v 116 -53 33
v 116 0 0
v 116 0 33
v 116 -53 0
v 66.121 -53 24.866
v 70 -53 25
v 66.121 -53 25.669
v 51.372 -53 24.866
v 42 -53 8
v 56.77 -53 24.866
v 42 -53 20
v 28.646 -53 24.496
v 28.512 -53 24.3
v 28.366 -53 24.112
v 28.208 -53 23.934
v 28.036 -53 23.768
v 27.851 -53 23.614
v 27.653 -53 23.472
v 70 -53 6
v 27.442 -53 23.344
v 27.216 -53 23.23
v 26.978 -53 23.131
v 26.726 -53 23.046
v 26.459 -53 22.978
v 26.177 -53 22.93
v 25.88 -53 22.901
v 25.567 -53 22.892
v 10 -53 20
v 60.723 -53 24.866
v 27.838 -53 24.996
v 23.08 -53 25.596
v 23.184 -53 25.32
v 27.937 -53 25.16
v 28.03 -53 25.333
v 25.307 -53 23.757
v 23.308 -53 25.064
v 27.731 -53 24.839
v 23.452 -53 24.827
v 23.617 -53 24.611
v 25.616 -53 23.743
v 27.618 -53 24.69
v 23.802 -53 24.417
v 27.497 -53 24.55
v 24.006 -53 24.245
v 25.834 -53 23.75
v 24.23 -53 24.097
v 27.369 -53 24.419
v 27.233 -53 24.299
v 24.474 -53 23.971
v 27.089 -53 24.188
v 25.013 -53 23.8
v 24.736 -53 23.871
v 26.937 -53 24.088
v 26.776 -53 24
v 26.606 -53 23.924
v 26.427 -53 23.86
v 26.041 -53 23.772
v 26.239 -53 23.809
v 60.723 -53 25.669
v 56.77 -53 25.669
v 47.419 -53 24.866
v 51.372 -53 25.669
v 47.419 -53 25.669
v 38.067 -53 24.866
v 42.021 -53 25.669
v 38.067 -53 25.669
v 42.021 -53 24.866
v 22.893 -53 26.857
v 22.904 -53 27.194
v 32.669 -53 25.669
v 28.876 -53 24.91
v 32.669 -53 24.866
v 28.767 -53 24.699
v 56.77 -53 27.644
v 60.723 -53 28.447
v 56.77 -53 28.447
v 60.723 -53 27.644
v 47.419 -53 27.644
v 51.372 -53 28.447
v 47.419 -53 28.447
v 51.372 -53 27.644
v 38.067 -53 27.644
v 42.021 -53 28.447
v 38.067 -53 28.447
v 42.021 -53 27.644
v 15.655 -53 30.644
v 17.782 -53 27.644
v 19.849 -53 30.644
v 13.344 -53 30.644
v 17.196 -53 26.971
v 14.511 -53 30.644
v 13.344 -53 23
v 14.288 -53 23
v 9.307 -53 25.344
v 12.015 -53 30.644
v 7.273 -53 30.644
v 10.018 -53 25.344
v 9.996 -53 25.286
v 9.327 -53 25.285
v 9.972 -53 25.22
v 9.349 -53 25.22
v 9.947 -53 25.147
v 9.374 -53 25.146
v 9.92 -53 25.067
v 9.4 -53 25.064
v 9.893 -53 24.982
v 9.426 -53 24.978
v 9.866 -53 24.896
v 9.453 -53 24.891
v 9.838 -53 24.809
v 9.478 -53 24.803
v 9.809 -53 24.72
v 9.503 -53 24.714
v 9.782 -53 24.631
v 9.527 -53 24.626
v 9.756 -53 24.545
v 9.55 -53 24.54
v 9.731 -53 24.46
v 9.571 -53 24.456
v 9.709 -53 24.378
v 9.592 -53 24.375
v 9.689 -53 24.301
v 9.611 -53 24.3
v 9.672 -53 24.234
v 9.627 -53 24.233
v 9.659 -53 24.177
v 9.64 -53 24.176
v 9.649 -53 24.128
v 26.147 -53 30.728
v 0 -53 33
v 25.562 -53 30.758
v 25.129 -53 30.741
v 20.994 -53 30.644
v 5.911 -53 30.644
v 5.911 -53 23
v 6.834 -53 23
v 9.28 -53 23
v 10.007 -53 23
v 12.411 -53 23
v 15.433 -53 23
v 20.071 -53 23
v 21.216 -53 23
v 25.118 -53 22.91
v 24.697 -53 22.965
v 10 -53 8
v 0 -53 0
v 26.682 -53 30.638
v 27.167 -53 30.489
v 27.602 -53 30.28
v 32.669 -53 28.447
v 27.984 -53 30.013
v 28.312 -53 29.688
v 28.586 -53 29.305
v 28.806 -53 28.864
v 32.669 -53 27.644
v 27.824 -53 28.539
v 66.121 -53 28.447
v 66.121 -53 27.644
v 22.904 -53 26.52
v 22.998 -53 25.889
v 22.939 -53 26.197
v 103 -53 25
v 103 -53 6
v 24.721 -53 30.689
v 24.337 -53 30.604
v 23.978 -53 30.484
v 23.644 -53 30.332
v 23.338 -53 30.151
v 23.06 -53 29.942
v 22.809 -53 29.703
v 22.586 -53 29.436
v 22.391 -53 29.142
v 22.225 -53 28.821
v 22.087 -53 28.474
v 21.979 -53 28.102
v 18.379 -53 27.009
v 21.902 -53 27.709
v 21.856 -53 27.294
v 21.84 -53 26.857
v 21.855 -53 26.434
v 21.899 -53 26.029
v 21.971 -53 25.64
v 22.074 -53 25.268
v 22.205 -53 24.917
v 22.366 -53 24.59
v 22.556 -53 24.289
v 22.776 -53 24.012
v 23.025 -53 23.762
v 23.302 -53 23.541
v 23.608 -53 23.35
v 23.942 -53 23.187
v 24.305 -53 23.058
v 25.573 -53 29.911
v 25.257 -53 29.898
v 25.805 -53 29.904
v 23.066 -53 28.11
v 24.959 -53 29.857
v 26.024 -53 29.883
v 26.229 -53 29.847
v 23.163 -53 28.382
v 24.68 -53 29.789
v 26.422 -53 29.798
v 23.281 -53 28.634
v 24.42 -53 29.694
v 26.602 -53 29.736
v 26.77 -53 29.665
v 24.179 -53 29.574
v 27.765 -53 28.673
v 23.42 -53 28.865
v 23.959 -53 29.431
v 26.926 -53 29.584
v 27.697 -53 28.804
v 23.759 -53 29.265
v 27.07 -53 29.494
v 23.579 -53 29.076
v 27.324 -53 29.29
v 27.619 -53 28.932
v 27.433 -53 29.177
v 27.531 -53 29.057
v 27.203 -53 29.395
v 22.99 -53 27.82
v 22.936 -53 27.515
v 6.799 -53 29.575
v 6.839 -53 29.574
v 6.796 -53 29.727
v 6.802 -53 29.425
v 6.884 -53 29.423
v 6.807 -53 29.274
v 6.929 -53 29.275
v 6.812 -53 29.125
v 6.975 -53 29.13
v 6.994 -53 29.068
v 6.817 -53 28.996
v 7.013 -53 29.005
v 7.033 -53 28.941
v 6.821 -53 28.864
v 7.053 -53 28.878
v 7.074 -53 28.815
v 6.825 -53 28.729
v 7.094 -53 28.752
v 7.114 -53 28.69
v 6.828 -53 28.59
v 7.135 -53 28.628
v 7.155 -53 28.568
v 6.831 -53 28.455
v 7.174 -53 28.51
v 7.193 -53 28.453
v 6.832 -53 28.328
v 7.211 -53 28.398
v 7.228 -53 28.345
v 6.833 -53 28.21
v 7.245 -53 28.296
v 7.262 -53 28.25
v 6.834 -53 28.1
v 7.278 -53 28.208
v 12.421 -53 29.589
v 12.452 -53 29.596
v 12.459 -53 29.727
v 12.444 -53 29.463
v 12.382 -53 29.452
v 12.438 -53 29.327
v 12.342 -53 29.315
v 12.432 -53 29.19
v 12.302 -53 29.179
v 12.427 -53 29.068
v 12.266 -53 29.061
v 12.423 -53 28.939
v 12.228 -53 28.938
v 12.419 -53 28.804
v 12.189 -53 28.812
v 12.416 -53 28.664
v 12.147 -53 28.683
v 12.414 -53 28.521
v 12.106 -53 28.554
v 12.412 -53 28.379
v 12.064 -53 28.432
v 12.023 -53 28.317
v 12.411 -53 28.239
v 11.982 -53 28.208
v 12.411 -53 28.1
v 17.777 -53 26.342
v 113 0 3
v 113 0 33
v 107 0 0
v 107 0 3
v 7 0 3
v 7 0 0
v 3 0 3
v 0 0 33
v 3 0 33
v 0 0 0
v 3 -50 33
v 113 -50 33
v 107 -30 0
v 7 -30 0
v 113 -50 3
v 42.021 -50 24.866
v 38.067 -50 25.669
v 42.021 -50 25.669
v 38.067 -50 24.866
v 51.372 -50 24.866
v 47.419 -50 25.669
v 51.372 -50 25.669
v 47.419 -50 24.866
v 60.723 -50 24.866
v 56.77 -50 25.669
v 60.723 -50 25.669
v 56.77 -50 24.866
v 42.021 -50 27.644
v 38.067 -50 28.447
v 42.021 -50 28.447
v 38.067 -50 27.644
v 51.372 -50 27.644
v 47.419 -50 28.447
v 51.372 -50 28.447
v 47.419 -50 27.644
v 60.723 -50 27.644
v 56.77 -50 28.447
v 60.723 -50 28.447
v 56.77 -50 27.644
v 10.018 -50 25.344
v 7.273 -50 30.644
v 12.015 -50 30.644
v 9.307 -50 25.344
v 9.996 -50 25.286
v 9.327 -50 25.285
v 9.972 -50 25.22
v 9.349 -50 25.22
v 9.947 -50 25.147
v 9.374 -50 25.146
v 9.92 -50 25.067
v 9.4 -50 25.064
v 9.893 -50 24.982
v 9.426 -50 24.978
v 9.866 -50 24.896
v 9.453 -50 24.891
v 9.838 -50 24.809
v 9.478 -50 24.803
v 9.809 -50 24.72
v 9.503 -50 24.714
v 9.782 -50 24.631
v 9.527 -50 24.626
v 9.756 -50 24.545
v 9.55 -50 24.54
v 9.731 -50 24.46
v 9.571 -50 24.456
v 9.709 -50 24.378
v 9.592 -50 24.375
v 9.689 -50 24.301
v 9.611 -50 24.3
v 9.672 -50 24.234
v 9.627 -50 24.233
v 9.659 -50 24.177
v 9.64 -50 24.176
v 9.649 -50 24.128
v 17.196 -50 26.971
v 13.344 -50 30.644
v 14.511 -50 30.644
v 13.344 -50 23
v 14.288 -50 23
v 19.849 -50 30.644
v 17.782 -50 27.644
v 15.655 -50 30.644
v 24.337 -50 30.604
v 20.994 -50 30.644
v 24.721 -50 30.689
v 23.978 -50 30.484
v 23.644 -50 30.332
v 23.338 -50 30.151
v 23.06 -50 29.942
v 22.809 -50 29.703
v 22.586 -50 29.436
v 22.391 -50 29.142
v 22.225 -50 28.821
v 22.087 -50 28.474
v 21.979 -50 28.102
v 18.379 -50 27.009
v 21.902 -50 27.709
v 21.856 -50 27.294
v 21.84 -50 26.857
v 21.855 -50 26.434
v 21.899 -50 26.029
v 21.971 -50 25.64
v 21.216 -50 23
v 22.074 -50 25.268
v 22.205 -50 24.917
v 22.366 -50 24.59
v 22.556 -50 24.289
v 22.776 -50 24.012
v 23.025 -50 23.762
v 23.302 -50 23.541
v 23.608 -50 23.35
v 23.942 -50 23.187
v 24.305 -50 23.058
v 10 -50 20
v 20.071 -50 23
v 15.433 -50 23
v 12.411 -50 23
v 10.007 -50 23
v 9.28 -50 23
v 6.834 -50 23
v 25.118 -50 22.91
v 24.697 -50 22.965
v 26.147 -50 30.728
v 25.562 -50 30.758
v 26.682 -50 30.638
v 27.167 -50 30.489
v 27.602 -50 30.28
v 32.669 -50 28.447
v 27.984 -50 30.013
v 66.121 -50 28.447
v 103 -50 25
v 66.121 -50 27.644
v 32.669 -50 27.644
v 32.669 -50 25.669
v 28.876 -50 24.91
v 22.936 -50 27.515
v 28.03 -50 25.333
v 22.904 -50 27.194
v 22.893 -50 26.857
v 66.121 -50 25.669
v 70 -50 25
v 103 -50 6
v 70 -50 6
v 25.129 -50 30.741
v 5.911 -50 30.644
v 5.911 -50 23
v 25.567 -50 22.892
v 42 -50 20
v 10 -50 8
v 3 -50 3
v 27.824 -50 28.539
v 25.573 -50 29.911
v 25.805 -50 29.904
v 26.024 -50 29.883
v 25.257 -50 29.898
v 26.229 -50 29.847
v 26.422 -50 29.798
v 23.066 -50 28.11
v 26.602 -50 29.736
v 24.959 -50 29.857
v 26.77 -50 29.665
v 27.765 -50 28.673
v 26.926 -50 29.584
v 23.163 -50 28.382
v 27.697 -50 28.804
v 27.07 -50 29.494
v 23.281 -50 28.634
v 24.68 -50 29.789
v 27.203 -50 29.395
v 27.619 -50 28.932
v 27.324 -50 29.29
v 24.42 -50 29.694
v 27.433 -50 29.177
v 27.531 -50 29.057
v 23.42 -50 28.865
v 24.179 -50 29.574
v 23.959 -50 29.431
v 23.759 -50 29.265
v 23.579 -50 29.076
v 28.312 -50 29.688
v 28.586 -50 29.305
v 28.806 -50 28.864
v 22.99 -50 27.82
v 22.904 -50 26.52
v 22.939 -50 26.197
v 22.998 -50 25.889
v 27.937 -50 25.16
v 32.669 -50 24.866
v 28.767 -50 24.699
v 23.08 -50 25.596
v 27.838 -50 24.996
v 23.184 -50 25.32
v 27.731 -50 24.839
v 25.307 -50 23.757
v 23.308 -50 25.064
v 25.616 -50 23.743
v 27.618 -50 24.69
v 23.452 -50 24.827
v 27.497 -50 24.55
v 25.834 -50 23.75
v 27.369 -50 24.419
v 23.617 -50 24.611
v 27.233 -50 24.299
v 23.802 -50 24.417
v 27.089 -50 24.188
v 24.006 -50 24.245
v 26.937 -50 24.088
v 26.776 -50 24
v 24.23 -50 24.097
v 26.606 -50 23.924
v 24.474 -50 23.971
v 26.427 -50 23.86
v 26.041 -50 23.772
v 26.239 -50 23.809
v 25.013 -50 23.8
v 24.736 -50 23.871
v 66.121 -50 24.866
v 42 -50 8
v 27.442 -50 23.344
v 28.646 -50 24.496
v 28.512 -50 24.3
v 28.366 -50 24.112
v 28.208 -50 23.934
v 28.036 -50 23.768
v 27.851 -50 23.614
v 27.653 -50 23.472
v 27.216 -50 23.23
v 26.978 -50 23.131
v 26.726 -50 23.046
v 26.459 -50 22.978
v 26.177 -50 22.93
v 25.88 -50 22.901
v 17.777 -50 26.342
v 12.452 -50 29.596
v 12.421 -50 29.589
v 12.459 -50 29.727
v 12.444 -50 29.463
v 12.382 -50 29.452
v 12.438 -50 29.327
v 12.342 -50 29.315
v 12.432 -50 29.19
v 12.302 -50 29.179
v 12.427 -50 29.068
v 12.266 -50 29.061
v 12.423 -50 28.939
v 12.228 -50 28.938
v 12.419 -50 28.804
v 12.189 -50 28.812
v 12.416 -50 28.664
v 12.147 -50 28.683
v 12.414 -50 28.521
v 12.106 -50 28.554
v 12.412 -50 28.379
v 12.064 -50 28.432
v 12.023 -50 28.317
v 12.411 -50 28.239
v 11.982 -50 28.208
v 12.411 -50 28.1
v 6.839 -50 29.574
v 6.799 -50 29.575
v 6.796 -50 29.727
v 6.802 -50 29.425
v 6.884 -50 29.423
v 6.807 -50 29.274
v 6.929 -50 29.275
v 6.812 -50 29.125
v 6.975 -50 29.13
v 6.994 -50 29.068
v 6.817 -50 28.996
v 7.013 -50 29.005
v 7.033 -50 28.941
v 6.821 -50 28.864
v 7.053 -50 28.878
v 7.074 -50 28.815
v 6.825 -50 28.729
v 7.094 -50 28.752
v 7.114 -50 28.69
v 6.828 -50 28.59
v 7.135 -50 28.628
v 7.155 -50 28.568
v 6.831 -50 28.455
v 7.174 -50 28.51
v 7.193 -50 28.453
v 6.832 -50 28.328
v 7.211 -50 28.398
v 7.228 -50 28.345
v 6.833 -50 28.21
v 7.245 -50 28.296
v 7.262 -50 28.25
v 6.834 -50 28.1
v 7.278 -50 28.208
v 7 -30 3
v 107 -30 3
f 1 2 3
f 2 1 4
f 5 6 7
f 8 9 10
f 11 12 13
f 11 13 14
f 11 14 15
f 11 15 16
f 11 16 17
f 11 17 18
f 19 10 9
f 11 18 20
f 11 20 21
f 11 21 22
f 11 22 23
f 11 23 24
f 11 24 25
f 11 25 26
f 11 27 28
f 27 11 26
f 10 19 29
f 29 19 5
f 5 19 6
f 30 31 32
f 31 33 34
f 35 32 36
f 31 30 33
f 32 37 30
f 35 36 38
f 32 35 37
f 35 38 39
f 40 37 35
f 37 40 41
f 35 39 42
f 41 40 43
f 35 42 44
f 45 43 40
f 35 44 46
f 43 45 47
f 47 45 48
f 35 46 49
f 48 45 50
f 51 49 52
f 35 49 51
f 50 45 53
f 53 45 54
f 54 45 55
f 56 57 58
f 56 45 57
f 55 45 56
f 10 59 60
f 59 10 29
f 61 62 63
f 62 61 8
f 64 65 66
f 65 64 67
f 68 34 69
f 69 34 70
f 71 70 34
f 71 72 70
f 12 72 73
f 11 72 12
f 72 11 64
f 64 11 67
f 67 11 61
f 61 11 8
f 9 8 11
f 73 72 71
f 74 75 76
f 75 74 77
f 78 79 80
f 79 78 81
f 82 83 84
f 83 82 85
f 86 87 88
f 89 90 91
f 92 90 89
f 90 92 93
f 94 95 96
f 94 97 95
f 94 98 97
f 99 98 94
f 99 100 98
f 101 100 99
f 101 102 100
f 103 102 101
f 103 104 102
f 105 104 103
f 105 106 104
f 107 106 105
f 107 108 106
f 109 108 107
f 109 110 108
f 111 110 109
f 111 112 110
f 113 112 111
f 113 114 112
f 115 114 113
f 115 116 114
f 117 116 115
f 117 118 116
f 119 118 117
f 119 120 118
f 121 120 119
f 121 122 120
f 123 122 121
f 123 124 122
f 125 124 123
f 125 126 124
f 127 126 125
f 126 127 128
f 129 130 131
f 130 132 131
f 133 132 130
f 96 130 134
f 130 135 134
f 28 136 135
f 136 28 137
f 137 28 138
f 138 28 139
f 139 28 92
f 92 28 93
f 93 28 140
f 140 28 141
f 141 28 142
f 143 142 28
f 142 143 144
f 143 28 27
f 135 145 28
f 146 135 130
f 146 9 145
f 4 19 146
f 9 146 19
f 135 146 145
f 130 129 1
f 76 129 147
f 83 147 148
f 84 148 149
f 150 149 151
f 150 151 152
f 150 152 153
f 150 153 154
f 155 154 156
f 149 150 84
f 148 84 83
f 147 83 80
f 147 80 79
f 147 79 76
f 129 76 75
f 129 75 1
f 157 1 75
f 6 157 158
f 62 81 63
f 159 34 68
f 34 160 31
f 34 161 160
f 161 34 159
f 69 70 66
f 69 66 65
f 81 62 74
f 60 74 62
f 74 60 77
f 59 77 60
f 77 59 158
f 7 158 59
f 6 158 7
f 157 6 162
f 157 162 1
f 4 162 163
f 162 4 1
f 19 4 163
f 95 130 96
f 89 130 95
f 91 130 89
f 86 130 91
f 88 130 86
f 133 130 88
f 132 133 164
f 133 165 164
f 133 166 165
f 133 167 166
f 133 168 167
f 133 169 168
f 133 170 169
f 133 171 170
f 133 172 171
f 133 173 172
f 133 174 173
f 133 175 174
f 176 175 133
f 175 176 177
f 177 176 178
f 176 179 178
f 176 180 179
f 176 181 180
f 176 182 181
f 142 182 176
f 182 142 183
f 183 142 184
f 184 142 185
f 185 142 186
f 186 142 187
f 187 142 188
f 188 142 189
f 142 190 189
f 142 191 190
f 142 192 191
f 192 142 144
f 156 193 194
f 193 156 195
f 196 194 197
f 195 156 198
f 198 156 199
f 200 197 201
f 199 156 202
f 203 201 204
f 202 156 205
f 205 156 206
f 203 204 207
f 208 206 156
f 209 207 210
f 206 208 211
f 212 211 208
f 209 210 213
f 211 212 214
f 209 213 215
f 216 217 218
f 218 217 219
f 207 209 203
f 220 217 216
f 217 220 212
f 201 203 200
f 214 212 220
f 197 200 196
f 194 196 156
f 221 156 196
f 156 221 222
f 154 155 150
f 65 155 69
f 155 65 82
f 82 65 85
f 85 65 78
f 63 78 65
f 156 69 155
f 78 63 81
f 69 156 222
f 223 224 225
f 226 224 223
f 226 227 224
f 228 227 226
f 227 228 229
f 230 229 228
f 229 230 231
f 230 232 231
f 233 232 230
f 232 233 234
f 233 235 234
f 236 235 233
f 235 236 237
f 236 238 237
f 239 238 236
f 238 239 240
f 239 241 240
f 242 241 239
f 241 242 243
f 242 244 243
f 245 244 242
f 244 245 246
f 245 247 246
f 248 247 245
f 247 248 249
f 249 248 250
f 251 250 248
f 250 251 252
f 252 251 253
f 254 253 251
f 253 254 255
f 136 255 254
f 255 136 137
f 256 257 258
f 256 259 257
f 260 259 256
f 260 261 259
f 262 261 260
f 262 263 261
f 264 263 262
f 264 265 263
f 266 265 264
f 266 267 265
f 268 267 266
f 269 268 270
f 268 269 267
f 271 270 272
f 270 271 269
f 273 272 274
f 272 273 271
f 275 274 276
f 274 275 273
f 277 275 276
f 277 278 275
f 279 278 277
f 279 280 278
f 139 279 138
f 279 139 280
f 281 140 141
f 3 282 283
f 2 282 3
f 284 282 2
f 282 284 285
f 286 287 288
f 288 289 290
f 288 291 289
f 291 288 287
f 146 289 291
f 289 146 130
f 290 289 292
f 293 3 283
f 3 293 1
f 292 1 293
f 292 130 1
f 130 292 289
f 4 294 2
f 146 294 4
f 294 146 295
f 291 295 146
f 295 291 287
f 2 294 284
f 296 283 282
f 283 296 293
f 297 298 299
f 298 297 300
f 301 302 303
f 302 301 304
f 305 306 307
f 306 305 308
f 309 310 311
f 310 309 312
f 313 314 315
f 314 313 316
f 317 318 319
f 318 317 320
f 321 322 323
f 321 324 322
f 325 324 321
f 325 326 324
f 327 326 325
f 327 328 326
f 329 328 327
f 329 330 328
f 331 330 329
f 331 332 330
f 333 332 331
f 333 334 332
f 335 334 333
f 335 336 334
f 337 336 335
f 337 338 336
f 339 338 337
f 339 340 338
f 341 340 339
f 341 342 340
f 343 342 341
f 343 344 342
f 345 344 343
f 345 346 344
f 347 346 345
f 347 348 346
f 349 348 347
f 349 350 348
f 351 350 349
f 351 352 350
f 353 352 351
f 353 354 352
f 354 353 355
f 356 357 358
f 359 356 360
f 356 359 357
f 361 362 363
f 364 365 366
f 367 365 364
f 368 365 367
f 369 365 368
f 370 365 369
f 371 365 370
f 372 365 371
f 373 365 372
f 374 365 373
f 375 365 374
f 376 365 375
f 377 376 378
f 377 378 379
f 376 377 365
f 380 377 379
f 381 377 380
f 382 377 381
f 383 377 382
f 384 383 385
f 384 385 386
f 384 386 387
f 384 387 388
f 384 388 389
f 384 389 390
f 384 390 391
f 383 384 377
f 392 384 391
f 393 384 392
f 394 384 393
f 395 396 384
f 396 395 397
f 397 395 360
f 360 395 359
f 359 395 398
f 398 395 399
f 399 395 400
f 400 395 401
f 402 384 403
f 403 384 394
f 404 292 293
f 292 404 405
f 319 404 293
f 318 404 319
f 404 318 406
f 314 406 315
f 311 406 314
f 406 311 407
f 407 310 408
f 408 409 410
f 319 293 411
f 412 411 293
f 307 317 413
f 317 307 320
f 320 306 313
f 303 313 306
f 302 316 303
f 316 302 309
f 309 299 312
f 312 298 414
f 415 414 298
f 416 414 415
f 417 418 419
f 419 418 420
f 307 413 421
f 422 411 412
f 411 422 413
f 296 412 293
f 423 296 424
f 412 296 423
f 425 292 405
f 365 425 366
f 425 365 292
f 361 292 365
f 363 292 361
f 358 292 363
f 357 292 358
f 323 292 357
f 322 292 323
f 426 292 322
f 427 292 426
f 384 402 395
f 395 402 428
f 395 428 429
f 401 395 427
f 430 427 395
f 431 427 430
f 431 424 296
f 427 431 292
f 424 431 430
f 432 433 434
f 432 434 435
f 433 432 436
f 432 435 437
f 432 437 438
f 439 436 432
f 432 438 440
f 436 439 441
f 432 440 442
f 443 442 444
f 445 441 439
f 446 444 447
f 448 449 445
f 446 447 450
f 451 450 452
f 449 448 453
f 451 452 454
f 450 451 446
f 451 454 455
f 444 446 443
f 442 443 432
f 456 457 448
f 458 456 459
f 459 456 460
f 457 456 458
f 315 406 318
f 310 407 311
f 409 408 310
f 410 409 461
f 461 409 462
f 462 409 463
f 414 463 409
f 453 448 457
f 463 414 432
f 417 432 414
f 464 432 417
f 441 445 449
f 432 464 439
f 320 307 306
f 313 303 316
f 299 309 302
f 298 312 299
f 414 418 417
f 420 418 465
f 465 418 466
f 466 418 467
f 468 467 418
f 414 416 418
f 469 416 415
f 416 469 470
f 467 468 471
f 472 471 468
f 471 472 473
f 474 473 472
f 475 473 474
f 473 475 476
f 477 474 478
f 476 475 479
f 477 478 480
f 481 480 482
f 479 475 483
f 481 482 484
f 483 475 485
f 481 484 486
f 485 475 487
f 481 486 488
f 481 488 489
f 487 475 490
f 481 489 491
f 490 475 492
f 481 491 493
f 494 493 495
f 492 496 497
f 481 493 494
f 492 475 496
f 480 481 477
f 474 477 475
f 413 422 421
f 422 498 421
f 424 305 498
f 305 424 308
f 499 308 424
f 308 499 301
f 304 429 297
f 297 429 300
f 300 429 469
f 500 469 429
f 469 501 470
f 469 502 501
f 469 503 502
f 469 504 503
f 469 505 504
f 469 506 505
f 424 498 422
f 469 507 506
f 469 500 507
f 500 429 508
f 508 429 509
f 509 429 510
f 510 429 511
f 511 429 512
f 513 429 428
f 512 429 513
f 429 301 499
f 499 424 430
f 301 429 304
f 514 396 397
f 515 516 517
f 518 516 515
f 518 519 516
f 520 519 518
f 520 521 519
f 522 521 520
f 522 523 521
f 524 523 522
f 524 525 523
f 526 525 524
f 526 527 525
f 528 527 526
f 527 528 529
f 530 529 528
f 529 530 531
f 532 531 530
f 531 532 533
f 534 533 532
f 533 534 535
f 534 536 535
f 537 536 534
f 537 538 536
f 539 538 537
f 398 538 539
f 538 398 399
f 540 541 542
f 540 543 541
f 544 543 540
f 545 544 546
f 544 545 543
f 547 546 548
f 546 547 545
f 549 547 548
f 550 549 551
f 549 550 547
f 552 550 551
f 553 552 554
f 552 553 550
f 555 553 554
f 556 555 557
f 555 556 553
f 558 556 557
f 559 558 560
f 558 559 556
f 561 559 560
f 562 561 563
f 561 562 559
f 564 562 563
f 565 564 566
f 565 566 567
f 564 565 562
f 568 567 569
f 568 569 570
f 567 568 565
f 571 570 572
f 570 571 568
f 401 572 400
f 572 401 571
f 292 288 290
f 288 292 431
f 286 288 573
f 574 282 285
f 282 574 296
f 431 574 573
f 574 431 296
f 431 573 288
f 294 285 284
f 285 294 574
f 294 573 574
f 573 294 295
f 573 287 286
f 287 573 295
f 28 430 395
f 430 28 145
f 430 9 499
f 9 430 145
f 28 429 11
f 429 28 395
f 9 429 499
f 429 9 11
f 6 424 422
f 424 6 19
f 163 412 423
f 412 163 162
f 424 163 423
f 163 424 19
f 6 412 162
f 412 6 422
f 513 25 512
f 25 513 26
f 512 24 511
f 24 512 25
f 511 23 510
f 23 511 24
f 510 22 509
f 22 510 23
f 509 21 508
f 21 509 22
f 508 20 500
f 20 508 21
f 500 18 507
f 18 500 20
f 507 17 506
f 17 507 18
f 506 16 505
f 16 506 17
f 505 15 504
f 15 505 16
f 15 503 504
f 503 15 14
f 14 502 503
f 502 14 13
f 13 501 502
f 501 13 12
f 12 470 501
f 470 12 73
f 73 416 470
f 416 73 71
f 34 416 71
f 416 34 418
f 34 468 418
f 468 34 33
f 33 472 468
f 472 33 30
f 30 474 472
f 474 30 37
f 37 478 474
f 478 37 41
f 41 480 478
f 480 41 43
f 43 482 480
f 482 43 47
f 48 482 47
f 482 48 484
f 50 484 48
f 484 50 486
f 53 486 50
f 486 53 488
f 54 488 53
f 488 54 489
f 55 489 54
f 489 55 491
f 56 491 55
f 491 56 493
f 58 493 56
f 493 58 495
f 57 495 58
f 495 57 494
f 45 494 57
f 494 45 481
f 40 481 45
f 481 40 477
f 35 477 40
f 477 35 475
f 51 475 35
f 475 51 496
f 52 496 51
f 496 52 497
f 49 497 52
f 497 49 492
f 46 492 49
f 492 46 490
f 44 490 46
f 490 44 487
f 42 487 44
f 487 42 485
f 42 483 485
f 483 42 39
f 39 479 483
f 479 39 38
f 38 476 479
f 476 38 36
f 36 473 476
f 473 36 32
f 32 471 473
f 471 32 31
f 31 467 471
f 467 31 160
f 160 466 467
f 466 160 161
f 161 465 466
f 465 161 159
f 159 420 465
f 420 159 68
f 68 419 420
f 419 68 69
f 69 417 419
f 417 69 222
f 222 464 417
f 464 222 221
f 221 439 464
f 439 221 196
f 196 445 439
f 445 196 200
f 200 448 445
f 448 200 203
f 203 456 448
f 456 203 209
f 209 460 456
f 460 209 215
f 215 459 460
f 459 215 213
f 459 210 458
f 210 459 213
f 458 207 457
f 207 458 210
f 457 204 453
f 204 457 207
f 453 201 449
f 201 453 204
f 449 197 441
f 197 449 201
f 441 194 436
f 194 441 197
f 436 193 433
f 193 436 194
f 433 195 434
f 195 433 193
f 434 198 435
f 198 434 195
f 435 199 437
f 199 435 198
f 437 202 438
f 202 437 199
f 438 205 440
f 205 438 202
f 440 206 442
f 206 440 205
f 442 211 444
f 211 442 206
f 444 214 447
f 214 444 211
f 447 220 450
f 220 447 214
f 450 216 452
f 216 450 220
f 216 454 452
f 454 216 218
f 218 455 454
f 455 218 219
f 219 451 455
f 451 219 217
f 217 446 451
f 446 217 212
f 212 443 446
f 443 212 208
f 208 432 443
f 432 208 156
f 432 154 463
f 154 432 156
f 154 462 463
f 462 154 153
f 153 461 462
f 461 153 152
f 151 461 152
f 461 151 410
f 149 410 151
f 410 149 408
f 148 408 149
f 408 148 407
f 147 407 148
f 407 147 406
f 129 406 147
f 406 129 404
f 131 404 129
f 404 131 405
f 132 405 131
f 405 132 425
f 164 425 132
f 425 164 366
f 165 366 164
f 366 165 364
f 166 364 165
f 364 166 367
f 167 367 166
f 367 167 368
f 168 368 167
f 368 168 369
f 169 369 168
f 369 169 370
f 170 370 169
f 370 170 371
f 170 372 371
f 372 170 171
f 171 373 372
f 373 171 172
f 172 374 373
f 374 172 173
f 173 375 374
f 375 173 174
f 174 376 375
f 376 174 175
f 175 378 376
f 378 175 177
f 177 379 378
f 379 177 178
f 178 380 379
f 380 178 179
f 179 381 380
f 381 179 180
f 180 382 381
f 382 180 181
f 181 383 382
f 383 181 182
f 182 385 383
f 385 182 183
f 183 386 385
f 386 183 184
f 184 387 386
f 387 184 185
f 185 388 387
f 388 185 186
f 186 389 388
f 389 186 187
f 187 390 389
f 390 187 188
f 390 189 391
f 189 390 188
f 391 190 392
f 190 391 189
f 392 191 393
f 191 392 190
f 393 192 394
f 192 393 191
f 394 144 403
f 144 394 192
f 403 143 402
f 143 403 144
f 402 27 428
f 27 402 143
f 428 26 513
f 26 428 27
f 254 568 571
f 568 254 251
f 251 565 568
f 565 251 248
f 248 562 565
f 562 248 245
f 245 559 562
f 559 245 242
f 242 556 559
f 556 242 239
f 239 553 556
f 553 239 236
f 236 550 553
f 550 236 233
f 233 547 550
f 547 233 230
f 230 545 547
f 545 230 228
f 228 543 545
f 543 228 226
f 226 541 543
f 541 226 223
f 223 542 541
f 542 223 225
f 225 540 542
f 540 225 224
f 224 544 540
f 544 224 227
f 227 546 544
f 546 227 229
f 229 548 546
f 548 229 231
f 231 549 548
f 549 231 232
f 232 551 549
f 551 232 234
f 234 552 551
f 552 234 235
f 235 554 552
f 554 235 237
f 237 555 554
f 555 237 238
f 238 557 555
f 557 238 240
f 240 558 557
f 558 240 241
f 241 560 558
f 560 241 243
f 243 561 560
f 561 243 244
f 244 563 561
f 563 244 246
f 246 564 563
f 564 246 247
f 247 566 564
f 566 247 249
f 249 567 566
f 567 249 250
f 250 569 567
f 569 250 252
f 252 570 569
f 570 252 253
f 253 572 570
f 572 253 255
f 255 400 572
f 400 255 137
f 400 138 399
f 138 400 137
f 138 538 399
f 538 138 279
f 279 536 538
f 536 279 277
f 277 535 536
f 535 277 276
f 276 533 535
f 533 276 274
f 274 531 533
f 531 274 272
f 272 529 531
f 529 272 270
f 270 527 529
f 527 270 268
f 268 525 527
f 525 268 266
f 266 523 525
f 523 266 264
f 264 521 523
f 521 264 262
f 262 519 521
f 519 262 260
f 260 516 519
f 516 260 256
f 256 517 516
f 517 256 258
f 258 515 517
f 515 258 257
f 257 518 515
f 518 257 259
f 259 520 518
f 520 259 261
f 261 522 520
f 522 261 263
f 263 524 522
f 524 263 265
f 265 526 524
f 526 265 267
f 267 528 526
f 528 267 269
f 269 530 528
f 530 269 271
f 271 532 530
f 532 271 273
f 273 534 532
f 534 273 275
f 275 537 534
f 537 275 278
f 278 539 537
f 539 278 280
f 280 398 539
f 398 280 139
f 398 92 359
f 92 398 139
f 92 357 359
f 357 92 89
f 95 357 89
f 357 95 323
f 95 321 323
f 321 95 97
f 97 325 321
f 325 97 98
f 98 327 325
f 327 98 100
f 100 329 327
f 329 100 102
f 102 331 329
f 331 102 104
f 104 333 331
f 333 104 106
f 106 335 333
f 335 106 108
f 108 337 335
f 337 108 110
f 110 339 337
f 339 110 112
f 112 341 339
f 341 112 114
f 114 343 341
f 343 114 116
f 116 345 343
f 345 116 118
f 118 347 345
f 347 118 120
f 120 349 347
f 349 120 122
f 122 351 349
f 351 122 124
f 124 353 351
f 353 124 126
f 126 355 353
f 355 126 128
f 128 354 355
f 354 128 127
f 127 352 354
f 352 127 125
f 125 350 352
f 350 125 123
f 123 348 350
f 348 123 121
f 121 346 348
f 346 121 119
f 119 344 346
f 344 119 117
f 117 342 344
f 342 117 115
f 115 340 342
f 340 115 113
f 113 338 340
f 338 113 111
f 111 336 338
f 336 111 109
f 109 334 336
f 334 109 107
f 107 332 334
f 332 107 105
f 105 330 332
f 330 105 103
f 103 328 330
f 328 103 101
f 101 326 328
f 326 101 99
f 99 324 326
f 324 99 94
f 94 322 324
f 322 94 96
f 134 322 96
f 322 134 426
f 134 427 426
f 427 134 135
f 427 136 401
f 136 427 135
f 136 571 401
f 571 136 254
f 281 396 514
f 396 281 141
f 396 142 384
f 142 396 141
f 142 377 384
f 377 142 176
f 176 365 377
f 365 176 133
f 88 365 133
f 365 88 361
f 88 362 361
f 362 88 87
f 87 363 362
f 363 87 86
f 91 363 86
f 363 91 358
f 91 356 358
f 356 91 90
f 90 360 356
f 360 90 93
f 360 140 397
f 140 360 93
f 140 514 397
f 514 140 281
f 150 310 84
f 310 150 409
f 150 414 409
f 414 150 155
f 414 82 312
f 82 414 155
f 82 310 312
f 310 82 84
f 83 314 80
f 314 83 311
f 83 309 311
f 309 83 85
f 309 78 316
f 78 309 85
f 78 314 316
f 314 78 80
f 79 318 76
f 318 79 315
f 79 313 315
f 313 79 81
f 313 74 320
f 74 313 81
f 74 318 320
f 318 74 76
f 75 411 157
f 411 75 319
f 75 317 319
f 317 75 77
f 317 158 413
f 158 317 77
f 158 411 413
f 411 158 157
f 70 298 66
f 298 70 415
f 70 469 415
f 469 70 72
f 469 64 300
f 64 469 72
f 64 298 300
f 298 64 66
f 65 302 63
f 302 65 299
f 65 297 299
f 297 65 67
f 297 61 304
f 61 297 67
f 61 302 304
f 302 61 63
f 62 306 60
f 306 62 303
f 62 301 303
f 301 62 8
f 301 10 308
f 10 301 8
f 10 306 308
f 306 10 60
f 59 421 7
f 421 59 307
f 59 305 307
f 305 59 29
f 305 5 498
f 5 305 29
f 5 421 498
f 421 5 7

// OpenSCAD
texto="MXC = = = =";
//medidas caixa principal
anchox=110;
fondoy=30;
altoz=50;
marxen=3;

//medidas enchufe 
banchox=33;
bfondoy=50;
baltoz=19;

//medidas interruptor
ianchox=32;
ifondoy=50;
ialtoz=12;




rotate([90,0,0])
{

difference() {
			difference() {
						difference() {
									difference() {
									difference() {
						 						//cuadrado principal
						 						cube([anchox+(marxen*2),fondoy+marxen,altoz+marxen]);
						 						translate([marxen,marxen,0]){
						 							color("blue") 
													cube([anchox,fondoy,altoz]);
													}
												}
											translate([7,0,0]){
													cube([anchox-10,fondoy-0,altoz-20]);							
													}		
																	
											}	

									//cuadrado interruptor
									
									rotate([90,0,0]){
									   				 translate([10,10,-20])
									  				 color("red") cube([ianchox,ifondoy+0,ialtoz]);
													}
									
					    				}
						//cuadrado enchufe
						rotate([90,0,0]){
							color("green")
							translate([70,10,-25])
							cube([banchox,bfondoy,baltoz]);
								}	
						}
						// texto
						//rotate([0,0,90]){	
						translate([5,23,0]){
												//rotate([0,0,0])
												color("brown")
												linear_extrude(height = 110)
												text(texto, size=8);
												}
						}
			}
//}
